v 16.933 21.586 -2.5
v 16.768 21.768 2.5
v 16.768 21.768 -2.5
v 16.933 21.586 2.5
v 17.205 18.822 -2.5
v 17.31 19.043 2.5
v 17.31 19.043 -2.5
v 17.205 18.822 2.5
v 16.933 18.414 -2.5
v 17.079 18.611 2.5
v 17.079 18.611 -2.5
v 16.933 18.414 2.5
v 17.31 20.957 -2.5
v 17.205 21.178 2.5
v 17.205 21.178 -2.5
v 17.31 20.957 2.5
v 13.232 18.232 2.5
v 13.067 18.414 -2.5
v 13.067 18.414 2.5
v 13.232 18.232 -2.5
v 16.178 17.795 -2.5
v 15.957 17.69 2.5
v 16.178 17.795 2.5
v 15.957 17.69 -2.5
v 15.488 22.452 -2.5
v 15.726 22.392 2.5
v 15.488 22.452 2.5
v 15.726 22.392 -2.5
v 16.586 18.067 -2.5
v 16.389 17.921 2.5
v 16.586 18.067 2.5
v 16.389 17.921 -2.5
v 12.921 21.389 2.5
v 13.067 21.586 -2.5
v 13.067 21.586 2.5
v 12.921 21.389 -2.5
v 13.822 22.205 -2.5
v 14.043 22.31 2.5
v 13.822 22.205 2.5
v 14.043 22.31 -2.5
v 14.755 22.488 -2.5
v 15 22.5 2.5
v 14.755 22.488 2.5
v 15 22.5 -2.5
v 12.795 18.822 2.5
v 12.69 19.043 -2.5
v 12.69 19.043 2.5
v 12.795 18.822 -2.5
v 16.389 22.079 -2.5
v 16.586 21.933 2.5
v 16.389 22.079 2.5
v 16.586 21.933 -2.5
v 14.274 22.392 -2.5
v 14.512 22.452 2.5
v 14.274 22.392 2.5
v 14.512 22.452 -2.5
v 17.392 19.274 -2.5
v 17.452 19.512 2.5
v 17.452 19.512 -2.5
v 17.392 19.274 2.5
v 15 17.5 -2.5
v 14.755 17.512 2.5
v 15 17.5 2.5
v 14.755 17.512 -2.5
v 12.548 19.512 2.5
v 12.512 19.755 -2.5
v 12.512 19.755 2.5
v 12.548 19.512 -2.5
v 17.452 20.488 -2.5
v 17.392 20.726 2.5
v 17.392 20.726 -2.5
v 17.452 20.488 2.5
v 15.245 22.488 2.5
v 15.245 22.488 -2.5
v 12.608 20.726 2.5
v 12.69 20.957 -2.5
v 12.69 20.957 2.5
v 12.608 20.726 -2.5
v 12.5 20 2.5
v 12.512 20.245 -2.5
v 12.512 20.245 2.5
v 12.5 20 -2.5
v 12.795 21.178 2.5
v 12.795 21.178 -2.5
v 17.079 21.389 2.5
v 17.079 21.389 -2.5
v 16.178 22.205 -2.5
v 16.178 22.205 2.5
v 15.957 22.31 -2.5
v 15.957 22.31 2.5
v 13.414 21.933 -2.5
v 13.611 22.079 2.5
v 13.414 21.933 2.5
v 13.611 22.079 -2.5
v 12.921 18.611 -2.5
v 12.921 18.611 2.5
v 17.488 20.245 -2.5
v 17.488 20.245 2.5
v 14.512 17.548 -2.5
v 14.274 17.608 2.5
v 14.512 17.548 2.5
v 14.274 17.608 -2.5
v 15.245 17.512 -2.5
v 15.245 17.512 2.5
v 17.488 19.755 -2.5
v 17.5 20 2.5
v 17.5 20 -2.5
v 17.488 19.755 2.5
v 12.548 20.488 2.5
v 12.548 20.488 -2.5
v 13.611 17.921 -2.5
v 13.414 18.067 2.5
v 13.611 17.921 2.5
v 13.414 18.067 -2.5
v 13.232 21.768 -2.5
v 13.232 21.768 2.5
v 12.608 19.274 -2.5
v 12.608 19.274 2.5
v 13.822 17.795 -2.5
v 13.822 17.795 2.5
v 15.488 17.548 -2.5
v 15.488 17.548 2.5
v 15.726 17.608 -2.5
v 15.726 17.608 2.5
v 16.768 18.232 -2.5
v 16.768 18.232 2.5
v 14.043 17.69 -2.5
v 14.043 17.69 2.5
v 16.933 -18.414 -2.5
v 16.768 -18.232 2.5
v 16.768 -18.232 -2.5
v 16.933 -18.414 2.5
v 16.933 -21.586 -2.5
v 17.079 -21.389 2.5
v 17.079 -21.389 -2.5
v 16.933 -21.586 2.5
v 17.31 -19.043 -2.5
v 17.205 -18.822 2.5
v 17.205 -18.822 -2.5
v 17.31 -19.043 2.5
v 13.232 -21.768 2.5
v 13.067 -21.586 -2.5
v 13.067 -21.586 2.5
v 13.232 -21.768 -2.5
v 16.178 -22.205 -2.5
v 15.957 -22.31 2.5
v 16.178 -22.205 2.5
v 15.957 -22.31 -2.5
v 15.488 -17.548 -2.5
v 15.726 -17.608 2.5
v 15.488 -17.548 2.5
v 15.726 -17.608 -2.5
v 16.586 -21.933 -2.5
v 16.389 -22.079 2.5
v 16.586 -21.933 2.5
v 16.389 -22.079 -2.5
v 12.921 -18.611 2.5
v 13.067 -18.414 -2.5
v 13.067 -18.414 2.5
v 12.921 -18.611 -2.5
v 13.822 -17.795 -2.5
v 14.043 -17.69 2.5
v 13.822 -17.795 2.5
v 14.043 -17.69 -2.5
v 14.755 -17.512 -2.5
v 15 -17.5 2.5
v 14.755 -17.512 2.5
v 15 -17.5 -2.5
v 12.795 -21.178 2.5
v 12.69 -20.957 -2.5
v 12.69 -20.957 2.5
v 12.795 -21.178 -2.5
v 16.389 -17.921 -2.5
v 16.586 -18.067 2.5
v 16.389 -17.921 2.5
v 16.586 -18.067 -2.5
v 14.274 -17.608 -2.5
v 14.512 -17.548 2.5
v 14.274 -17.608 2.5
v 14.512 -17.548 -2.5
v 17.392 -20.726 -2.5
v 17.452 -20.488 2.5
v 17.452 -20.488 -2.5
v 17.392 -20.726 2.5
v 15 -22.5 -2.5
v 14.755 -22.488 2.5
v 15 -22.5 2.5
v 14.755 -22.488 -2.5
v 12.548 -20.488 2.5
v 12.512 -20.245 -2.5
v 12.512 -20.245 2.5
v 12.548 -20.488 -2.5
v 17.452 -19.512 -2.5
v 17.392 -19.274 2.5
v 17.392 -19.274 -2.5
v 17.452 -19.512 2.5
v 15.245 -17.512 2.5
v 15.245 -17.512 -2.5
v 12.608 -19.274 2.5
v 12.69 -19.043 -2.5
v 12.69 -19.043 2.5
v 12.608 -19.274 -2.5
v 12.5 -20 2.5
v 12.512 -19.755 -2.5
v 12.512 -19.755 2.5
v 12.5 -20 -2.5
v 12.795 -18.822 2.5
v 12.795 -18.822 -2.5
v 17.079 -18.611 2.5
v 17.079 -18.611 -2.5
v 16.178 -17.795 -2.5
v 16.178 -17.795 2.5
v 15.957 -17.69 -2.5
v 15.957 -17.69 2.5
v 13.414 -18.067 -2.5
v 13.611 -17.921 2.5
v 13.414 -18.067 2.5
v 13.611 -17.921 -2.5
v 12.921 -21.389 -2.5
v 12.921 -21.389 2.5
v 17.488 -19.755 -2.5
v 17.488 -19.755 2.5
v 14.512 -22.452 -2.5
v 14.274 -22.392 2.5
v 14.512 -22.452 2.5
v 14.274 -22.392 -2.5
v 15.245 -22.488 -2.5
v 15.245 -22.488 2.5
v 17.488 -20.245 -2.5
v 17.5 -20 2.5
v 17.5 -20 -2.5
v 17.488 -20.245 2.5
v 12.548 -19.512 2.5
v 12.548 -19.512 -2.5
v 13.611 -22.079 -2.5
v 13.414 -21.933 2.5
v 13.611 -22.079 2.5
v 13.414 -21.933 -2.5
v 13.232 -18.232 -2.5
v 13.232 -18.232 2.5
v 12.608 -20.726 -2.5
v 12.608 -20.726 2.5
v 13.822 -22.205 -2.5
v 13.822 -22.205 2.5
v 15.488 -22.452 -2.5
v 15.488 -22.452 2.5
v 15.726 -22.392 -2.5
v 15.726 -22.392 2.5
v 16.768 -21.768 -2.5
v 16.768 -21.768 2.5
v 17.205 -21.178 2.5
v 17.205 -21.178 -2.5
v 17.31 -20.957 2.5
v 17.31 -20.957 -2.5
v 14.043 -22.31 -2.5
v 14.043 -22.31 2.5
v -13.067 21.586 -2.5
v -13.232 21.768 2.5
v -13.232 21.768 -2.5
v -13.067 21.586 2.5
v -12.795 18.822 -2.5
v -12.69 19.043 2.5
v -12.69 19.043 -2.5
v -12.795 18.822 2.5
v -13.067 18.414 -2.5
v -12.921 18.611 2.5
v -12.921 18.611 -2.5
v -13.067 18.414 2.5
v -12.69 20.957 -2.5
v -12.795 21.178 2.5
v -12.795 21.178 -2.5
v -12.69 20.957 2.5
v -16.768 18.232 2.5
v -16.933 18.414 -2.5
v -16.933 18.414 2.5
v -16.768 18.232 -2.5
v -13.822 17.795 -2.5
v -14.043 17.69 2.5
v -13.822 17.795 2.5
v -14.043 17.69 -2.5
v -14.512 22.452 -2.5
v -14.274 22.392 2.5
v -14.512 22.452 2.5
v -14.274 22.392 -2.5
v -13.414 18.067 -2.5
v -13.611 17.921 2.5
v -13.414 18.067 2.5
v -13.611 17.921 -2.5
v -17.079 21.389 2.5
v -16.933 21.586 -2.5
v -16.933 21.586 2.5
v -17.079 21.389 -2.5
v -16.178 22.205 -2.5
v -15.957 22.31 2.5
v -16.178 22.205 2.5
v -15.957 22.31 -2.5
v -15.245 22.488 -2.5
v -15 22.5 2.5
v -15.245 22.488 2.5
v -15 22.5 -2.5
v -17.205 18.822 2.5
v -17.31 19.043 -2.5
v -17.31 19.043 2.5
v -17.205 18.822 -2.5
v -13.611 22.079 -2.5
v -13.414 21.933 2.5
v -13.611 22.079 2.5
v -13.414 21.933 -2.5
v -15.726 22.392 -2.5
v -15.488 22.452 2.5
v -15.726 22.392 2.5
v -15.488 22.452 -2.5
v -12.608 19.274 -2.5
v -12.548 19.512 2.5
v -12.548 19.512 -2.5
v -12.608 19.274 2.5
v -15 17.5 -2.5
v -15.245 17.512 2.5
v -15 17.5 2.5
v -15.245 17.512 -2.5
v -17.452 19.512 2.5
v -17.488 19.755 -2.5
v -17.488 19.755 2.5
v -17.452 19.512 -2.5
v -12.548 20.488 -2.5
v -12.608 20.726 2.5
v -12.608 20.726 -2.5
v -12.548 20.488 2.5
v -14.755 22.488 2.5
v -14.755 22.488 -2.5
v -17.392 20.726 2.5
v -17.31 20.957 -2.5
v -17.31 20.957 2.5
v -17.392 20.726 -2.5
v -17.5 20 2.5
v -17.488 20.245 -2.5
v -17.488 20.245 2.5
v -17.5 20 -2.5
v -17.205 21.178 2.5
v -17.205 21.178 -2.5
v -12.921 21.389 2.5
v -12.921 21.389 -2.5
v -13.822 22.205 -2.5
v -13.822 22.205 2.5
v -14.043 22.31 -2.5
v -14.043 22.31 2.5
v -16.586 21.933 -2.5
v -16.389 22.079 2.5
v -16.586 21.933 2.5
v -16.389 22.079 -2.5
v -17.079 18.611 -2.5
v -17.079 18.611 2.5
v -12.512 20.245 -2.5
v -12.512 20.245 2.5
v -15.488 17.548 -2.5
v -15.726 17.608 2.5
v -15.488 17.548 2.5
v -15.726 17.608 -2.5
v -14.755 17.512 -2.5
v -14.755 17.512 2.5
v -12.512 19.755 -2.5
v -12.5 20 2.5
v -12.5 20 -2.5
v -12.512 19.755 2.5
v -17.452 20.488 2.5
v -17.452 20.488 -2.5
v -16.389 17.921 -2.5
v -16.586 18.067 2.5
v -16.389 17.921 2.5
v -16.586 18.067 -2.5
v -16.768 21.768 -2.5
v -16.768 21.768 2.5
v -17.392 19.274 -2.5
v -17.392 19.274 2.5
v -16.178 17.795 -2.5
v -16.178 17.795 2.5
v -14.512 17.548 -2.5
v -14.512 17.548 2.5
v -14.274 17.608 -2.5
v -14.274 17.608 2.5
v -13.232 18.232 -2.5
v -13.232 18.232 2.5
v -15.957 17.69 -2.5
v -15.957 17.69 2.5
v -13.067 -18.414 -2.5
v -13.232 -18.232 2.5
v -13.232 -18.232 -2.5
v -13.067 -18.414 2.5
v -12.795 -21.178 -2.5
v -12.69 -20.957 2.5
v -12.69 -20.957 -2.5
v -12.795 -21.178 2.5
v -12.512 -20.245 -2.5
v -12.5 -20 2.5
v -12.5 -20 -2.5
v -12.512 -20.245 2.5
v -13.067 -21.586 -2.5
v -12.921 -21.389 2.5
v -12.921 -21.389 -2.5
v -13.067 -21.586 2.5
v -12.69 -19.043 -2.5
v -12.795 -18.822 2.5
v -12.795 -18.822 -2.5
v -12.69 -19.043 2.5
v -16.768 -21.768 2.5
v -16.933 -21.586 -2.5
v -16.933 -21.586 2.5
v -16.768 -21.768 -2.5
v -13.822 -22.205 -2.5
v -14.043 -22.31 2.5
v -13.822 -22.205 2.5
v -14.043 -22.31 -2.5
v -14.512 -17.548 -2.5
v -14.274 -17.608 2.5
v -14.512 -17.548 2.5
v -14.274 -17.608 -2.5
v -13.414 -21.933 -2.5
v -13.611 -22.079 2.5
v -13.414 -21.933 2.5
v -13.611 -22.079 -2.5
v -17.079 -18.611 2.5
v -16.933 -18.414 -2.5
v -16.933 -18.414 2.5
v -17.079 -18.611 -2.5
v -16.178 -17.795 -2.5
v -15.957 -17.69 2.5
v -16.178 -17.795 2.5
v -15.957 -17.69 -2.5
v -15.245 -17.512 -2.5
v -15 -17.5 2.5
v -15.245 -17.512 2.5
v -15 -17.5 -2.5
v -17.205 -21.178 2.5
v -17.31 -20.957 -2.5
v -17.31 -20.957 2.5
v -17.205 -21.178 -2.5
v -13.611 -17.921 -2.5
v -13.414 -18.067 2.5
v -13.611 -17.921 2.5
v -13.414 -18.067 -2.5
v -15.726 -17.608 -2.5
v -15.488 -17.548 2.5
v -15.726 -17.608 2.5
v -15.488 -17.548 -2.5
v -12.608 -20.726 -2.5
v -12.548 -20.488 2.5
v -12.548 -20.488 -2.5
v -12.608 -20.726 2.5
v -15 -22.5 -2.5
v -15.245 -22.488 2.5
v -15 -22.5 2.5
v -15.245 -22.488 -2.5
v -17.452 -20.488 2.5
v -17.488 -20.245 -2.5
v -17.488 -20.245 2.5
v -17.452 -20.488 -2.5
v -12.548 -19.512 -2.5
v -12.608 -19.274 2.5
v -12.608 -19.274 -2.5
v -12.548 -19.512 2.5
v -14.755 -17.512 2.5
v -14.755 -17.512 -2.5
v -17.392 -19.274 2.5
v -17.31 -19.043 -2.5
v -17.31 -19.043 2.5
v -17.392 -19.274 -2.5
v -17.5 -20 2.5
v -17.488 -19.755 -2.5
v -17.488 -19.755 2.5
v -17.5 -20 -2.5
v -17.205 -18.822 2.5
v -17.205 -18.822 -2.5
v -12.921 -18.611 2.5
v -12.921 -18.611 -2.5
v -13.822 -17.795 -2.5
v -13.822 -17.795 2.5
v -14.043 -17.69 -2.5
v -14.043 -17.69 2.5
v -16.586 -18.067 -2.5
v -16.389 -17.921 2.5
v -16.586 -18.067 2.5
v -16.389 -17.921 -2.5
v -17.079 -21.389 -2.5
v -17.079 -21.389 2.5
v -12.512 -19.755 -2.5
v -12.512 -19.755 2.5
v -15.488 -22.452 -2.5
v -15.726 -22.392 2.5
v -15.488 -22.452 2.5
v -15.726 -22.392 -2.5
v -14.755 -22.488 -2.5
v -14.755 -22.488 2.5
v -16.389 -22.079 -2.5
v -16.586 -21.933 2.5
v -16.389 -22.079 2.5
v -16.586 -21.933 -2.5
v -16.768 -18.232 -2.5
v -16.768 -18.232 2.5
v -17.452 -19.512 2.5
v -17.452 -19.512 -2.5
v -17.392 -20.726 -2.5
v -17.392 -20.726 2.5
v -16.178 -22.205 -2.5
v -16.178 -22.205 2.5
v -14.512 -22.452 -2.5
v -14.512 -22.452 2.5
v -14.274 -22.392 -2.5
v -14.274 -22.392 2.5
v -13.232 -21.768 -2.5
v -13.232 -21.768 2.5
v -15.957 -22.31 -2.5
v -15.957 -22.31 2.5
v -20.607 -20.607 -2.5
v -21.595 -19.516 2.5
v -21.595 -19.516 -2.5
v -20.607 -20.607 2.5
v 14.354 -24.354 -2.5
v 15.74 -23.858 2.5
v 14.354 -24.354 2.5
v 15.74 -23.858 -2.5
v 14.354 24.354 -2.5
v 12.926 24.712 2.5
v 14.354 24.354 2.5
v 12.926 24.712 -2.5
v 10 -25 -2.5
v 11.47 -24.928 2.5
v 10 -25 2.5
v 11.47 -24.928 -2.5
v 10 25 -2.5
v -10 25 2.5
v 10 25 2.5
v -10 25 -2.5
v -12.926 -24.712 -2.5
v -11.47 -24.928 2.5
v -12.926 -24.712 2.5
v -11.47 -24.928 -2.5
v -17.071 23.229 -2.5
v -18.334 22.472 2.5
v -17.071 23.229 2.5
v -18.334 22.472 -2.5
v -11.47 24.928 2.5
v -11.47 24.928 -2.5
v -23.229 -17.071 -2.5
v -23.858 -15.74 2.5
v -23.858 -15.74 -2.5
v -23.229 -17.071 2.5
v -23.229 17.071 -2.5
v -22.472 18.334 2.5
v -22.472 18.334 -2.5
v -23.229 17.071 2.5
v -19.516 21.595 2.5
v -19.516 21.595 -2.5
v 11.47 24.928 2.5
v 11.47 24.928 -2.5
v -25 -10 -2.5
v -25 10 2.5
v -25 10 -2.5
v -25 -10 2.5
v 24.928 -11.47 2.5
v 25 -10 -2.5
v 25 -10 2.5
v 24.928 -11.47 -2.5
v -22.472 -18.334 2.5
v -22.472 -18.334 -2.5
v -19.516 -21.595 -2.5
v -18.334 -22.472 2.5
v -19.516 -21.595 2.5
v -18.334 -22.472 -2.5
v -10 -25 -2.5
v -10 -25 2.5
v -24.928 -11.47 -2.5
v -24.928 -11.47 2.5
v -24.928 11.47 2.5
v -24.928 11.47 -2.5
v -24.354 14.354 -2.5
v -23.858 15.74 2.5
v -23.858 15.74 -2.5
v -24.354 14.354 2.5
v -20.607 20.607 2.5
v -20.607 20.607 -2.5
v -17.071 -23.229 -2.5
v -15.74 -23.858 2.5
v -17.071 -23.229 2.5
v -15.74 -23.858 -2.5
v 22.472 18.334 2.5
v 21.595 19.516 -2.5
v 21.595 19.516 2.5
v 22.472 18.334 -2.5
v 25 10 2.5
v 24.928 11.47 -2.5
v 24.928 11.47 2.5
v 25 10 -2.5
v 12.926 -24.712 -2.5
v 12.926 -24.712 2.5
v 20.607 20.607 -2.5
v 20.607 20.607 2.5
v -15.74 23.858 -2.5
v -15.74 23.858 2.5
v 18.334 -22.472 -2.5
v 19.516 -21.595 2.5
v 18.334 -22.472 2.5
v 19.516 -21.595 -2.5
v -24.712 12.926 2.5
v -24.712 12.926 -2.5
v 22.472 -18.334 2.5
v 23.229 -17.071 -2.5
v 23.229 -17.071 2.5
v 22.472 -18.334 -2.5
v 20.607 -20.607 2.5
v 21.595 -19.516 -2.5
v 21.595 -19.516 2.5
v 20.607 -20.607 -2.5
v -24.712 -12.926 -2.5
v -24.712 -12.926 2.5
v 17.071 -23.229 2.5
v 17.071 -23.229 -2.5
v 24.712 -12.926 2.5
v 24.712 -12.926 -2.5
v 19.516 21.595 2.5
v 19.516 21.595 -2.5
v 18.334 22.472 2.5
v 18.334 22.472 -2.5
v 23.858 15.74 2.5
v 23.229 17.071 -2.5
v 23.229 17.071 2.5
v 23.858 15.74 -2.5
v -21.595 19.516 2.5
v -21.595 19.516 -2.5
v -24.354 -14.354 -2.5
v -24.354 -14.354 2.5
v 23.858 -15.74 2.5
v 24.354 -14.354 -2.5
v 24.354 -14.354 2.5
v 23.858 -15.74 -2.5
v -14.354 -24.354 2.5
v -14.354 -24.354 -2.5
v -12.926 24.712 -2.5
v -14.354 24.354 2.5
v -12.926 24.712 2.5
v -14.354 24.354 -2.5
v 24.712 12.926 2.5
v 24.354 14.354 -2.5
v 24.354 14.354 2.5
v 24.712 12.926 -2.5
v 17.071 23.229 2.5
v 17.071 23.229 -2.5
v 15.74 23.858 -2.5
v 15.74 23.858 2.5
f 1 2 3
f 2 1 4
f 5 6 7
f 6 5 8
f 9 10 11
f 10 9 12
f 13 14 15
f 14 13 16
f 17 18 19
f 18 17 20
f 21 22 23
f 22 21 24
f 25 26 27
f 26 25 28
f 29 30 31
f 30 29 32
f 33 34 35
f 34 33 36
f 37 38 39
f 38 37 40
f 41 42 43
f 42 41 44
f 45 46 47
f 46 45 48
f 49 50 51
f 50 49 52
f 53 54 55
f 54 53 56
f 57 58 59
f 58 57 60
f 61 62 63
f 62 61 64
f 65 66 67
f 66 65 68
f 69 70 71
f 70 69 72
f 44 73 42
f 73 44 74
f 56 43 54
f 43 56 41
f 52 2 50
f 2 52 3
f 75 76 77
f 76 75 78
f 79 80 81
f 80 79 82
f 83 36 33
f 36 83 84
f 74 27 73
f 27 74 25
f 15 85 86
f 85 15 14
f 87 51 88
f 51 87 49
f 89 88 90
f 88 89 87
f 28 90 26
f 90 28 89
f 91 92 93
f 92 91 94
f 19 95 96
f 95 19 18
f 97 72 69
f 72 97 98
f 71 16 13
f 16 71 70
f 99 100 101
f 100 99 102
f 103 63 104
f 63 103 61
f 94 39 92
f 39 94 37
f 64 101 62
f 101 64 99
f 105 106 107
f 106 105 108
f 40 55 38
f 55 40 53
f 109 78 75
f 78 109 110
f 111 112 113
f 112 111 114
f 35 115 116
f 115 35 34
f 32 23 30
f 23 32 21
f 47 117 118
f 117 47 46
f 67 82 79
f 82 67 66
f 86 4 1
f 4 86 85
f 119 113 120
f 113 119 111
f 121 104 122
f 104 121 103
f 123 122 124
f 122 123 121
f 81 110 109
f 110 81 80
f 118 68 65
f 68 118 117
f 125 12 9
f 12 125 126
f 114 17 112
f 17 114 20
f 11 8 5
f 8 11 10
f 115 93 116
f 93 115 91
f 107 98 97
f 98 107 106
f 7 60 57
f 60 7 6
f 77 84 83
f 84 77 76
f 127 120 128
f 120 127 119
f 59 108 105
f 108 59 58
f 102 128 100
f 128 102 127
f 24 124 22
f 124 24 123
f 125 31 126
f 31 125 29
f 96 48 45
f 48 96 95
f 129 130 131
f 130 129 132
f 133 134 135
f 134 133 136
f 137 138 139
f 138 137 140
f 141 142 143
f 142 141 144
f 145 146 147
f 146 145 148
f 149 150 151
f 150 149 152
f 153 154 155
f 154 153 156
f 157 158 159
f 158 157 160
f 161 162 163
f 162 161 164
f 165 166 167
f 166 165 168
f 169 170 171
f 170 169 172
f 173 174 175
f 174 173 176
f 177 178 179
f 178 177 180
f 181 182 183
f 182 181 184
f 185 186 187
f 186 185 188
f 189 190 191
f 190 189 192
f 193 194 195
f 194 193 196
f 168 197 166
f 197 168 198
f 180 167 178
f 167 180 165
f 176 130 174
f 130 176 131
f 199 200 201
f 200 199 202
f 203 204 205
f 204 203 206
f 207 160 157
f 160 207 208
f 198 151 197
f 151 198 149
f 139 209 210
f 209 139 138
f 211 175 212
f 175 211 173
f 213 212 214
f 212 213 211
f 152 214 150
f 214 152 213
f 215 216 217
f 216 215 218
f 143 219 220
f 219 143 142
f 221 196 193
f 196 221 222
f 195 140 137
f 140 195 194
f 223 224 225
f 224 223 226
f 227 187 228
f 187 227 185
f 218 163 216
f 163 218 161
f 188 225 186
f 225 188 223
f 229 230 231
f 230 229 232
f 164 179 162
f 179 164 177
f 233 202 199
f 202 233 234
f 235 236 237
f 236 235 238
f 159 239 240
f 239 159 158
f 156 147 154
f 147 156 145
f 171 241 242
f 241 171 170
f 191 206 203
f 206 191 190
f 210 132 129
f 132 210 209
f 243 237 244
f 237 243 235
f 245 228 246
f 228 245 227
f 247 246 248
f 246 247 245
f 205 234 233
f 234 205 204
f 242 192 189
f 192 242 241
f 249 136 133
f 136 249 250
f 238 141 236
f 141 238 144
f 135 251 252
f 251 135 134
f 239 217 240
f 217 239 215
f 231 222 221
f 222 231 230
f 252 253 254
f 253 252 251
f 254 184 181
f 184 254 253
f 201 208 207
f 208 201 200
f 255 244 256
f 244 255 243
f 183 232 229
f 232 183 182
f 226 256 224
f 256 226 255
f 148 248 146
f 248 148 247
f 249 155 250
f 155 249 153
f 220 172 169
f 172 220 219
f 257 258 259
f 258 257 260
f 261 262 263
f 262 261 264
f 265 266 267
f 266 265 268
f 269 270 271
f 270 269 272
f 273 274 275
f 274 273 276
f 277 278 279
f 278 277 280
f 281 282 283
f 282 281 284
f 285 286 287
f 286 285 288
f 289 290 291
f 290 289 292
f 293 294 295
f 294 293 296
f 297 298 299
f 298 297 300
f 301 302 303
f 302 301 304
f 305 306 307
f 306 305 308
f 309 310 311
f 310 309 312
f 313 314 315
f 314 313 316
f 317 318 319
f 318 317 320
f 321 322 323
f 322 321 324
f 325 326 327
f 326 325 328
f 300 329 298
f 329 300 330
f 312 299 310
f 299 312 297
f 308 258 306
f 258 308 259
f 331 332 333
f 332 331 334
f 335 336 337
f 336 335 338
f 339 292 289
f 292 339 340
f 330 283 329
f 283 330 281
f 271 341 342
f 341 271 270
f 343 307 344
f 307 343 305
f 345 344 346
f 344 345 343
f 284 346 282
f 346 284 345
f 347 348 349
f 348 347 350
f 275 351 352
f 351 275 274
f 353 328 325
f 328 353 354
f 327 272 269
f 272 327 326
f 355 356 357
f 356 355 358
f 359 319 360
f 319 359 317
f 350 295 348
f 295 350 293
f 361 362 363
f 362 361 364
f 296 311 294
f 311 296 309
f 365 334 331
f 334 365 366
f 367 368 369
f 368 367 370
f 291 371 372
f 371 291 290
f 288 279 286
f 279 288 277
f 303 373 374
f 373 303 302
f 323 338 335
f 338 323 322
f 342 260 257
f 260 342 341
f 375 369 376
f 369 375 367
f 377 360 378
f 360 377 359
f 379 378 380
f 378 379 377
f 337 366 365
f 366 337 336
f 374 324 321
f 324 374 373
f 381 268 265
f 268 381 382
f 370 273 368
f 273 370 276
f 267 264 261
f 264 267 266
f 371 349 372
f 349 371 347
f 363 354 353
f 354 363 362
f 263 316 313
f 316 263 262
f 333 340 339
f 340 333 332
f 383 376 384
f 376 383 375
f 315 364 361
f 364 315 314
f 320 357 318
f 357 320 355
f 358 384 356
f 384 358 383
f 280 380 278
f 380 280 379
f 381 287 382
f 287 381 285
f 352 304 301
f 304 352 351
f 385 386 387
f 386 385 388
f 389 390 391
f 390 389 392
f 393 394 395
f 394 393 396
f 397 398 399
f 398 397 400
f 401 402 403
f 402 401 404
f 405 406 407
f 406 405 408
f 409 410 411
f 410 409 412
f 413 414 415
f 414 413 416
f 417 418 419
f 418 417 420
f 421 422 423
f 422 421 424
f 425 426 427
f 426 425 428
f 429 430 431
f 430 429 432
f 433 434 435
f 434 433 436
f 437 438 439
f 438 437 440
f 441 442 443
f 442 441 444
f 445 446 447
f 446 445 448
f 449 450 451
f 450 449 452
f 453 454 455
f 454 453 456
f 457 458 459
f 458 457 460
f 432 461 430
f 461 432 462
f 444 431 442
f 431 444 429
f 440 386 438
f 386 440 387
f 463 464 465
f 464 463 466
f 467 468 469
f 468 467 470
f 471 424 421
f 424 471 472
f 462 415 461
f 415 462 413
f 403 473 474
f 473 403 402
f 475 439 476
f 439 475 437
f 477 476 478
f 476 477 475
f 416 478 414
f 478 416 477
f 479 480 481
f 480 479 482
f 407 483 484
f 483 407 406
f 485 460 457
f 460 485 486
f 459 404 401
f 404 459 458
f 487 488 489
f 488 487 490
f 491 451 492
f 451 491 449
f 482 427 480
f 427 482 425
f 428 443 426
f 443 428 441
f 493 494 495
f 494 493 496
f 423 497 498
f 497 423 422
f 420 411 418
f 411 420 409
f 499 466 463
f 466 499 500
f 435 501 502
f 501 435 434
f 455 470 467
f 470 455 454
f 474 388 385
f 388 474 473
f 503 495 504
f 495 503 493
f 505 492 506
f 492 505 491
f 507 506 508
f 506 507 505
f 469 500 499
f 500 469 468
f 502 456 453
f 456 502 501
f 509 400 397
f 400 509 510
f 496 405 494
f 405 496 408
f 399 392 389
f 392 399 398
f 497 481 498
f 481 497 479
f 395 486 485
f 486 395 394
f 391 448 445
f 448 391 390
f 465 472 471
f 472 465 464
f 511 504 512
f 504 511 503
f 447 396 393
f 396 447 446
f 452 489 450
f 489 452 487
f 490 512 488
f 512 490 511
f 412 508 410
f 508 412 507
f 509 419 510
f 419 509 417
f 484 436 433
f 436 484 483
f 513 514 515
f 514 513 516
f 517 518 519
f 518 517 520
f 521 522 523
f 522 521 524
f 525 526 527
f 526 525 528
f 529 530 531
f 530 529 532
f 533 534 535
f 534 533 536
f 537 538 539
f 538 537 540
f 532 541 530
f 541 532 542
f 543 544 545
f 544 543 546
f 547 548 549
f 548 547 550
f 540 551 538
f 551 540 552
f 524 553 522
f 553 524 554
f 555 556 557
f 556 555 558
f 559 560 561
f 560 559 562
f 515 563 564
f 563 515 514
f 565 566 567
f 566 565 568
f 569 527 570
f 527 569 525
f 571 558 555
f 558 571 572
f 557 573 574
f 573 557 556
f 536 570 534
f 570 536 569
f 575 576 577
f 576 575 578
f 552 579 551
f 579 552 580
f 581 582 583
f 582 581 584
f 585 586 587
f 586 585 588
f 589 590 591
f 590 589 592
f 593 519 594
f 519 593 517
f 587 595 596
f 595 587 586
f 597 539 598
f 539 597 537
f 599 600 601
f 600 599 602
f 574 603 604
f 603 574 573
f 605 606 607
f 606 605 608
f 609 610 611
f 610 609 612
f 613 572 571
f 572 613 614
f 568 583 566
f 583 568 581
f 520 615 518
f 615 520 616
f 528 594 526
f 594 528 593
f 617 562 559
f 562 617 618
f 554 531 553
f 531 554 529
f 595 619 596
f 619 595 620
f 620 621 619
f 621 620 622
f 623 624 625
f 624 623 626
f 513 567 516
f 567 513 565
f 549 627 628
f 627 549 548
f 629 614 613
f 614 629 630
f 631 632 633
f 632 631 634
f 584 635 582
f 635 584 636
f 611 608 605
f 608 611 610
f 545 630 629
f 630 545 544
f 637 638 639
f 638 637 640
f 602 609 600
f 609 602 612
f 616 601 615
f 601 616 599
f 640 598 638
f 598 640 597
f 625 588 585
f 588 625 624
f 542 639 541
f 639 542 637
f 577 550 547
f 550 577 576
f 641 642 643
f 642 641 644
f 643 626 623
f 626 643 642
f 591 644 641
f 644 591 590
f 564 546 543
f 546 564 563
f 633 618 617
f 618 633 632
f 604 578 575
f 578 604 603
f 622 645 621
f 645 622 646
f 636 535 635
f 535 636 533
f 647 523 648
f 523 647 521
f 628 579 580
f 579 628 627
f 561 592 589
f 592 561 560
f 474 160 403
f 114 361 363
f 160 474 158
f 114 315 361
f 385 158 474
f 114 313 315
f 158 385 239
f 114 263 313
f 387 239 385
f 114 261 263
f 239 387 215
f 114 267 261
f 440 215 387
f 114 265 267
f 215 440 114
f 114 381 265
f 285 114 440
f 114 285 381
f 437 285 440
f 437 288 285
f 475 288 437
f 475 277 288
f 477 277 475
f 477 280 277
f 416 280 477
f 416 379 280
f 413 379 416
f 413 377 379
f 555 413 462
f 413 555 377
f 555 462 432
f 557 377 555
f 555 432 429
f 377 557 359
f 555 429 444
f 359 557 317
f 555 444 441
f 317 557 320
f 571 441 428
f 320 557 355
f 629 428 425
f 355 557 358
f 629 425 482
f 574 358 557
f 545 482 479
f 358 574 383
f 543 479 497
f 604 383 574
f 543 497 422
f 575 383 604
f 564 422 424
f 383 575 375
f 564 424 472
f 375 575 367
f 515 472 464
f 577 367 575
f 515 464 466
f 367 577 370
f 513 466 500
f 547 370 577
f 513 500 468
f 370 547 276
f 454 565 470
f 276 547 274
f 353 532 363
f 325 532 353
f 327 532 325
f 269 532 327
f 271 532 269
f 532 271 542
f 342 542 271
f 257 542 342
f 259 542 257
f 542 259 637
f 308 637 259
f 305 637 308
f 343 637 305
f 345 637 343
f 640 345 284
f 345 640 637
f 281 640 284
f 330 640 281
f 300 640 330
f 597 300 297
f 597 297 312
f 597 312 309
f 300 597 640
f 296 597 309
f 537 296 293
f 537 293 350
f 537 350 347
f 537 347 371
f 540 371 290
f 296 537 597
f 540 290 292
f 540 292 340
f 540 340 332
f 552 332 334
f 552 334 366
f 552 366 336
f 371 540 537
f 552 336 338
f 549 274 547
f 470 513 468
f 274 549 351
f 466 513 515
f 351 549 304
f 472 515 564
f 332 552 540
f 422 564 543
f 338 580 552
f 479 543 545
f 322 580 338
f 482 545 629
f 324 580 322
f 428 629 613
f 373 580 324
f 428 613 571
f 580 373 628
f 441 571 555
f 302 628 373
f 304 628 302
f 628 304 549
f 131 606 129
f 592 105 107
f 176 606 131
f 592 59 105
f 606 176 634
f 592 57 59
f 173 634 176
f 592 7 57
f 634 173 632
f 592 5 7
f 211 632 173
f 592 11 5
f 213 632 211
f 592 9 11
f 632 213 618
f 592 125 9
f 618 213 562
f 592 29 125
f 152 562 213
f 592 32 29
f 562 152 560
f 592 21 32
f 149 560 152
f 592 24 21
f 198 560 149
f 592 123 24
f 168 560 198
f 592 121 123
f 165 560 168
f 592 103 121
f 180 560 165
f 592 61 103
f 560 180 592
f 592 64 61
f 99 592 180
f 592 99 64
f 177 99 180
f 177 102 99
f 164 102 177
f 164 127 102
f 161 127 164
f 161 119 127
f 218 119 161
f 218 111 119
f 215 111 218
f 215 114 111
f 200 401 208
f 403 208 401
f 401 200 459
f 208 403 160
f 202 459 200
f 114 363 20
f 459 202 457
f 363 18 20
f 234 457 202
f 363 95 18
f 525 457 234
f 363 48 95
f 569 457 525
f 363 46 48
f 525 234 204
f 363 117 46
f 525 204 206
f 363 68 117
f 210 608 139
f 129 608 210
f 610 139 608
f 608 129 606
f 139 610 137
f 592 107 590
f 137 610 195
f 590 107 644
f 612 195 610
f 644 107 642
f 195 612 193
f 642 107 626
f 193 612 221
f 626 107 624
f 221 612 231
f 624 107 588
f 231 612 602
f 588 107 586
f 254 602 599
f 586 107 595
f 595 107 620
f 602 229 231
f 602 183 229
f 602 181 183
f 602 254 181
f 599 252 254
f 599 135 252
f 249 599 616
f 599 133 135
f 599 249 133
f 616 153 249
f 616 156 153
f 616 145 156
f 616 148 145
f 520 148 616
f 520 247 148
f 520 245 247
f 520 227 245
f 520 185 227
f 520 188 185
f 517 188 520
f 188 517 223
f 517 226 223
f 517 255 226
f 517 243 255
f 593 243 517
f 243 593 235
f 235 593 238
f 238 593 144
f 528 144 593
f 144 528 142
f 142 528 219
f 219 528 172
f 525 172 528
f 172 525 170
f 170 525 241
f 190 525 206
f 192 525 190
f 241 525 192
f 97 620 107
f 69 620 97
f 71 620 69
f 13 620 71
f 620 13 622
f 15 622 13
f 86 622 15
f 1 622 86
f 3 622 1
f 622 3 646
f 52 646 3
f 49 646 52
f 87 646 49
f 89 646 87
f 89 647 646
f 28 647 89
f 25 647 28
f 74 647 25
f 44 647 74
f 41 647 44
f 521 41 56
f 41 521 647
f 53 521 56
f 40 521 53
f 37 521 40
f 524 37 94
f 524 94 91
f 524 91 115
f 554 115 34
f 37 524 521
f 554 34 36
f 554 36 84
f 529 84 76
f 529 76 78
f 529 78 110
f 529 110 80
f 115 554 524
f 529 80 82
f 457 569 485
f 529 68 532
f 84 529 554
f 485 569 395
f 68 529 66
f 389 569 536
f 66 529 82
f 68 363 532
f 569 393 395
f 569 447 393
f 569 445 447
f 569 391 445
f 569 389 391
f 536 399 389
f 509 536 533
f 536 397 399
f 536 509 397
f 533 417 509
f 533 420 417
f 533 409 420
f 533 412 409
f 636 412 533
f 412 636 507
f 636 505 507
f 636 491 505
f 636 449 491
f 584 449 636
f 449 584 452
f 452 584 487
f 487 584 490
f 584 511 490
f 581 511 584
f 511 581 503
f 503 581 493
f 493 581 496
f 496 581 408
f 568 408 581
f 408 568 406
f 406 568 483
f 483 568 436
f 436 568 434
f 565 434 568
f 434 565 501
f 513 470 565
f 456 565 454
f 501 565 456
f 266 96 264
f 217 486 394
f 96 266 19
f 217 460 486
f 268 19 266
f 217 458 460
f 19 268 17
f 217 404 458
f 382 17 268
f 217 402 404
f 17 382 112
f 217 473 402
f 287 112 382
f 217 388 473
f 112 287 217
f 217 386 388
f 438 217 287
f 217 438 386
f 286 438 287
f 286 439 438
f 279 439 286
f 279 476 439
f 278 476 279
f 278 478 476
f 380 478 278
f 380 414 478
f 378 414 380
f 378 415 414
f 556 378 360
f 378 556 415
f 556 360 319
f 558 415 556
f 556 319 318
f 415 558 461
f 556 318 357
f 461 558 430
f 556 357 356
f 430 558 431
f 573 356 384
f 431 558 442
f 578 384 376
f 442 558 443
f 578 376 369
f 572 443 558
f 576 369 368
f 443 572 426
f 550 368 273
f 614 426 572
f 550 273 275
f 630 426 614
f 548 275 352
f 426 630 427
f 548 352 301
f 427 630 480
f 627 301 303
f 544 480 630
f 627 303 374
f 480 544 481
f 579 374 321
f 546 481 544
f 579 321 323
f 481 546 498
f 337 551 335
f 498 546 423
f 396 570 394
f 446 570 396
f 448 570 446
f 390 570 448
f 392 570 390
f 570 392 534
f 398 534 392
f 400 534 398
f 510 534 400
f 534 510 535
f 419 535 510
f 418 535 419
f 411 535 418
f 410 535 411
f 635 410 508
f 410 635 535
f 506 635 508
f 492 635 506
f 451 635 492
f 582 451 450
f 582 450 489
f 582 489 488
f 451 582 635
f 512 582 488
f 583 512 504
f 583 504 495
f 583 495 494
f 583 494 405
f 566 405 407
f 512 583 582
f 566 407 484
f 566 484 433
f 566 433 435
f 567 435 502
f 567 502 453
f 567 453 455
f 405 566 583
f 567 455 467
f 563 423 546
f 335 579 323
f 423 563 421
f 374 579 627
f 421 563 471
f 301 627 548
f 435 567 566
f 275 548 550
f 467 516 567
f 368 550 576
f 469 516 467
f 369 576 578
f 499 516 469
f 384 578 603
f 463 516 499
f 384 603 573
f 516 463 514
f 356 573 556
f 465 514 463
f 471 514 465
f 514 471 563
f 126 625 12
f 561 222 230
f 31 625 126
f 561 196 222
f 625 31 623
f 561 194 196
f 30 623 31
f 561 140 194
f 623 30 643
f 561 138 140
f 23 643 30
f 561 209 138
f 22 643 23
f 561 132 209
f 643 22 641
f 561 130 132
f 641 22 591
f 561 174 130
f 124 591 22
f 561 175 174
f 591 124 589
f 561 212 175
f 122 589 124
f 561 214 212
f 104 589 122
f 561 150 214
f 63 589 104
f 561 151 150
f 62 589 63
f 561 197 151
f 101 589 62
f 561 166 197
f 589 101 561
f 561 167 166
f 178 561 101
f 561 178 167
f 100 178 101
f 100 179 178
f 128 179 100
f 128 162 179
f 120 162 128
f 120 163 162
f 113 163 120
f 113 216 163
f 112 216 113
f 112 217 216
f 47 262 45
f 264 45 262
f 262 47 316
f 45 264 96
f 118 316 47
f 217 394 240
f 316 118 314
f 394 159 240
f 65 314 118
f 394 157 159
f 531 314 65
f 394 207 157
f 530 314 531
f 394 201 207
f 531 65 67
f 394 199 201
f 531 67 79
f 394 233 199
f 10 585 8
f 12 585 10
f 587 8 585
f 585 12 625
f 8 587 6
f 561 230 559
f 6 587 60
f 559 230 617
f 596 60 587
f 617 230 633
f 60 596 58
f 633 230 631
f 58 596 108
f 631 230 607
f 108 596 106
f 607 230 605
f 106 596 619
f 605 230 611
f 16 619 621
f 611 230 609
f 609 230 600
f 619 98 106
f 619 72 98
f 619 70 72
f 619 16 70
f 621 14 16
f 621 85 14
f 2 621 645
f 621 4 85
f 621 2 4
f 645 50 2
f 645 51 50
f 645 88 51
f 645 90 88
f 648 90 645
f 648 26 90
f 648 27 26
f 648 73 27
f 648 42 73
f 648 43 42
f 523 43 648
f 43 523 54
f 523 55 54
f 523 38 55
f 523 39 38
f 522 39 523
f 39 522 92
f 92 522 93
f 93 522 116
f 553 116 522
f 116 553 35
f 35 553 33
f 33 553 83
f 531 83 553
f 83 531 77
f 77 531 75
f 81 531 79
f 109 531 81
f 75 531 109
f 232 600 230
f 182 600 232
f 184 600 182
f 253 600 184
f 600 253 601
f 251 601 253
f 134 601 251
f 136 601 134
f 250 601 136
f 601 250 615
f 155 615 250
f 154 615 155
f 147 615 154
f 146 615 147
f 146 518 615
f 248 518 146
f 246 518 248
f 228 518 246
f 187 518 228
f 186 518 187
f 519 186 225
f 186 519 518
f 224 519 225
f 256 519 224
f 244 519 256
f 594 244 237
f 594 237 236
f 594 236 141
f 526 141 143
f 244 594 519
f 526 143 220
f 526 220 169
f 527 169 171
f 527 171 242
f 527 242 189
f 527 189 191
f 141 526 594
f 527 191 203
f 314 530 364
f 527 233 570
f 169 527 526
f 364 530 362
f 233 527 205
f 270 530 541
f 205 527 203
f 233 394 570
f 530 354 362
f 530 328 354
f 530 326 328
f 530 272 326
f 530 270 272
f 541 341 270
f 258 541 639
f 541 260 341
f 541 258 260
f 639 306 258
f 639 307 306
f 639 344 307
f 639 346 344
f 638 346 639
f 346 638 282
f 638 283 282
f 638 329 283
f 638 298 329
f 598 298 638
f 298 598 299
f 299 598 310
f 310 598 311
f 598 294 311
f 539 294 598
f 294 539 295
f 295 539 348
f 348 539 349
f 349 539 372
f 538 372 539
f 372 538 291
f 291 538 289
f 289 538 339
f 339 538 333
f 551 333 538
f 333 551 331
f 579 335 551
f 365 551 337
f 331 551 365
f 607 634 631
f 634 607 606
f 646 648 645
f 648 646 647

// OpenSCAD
$fn = 64;

module plate(x = 50, y = 50, z = 5, r_corner = 5){
    
    assert(r_corner < x/2 , "Too much radius corner");
    assert(r_corner < y/2 , "Too much radius corner");

    linear_extrude(height = z, center = true){
        
        offset(r = r_corner)
        square([x-2*r_corner,y-2*r_corner], center = true);
        
        }
    }
    
//plate();

module hole_slot(d = 5, h = 7, slot_length = 2){
    
    hull(){
        translate([-slot_length/2,0,0])
        cylinder(h = h,d = d,center = true);
        
        translate([slot_length/2,0,0])
        cylinder(h = h, d = d,center = true);
        }
    
    }
    
//hole_slot(d = 10,slot_length = 10);
    
    
module assembly(
    x = 50, 
    y = 50, 
    z = 5, 
    r_corner = 2,
    d = 5,  
    slot_length = 5,
    dist_border_x = 10,
    dist_border_y = 5){
        
    assert(dist_border_x > d/2 + slot_length/2, "Hole outside the plate");
    assert(dist_border_y > d/2, "Hole outside the plate");
    assert(slot_length < 20, "slot too big");
    assert(x/2 - dist_border_x > d/2 + slot_length/2, "holes too close");
    
        
    difference(){
        
        plate(x,y,z,r_corner);
        
        for(i = [x/2 - dist_border_x, -x/2 + dist_border_x]){
            for(j = [y/2 - dist_border_y, -y/2 + dist_border_y]){
                
                translate([i,j,0])
                    hole_slot(d = d, h = z+2, slot_length = slot_length);

                
                }
            }
        }
    }
    
    
assembly(r_corner = 15,dist_border_x = 10,slot_length = 0);  //slot_length = 0) for no slot
